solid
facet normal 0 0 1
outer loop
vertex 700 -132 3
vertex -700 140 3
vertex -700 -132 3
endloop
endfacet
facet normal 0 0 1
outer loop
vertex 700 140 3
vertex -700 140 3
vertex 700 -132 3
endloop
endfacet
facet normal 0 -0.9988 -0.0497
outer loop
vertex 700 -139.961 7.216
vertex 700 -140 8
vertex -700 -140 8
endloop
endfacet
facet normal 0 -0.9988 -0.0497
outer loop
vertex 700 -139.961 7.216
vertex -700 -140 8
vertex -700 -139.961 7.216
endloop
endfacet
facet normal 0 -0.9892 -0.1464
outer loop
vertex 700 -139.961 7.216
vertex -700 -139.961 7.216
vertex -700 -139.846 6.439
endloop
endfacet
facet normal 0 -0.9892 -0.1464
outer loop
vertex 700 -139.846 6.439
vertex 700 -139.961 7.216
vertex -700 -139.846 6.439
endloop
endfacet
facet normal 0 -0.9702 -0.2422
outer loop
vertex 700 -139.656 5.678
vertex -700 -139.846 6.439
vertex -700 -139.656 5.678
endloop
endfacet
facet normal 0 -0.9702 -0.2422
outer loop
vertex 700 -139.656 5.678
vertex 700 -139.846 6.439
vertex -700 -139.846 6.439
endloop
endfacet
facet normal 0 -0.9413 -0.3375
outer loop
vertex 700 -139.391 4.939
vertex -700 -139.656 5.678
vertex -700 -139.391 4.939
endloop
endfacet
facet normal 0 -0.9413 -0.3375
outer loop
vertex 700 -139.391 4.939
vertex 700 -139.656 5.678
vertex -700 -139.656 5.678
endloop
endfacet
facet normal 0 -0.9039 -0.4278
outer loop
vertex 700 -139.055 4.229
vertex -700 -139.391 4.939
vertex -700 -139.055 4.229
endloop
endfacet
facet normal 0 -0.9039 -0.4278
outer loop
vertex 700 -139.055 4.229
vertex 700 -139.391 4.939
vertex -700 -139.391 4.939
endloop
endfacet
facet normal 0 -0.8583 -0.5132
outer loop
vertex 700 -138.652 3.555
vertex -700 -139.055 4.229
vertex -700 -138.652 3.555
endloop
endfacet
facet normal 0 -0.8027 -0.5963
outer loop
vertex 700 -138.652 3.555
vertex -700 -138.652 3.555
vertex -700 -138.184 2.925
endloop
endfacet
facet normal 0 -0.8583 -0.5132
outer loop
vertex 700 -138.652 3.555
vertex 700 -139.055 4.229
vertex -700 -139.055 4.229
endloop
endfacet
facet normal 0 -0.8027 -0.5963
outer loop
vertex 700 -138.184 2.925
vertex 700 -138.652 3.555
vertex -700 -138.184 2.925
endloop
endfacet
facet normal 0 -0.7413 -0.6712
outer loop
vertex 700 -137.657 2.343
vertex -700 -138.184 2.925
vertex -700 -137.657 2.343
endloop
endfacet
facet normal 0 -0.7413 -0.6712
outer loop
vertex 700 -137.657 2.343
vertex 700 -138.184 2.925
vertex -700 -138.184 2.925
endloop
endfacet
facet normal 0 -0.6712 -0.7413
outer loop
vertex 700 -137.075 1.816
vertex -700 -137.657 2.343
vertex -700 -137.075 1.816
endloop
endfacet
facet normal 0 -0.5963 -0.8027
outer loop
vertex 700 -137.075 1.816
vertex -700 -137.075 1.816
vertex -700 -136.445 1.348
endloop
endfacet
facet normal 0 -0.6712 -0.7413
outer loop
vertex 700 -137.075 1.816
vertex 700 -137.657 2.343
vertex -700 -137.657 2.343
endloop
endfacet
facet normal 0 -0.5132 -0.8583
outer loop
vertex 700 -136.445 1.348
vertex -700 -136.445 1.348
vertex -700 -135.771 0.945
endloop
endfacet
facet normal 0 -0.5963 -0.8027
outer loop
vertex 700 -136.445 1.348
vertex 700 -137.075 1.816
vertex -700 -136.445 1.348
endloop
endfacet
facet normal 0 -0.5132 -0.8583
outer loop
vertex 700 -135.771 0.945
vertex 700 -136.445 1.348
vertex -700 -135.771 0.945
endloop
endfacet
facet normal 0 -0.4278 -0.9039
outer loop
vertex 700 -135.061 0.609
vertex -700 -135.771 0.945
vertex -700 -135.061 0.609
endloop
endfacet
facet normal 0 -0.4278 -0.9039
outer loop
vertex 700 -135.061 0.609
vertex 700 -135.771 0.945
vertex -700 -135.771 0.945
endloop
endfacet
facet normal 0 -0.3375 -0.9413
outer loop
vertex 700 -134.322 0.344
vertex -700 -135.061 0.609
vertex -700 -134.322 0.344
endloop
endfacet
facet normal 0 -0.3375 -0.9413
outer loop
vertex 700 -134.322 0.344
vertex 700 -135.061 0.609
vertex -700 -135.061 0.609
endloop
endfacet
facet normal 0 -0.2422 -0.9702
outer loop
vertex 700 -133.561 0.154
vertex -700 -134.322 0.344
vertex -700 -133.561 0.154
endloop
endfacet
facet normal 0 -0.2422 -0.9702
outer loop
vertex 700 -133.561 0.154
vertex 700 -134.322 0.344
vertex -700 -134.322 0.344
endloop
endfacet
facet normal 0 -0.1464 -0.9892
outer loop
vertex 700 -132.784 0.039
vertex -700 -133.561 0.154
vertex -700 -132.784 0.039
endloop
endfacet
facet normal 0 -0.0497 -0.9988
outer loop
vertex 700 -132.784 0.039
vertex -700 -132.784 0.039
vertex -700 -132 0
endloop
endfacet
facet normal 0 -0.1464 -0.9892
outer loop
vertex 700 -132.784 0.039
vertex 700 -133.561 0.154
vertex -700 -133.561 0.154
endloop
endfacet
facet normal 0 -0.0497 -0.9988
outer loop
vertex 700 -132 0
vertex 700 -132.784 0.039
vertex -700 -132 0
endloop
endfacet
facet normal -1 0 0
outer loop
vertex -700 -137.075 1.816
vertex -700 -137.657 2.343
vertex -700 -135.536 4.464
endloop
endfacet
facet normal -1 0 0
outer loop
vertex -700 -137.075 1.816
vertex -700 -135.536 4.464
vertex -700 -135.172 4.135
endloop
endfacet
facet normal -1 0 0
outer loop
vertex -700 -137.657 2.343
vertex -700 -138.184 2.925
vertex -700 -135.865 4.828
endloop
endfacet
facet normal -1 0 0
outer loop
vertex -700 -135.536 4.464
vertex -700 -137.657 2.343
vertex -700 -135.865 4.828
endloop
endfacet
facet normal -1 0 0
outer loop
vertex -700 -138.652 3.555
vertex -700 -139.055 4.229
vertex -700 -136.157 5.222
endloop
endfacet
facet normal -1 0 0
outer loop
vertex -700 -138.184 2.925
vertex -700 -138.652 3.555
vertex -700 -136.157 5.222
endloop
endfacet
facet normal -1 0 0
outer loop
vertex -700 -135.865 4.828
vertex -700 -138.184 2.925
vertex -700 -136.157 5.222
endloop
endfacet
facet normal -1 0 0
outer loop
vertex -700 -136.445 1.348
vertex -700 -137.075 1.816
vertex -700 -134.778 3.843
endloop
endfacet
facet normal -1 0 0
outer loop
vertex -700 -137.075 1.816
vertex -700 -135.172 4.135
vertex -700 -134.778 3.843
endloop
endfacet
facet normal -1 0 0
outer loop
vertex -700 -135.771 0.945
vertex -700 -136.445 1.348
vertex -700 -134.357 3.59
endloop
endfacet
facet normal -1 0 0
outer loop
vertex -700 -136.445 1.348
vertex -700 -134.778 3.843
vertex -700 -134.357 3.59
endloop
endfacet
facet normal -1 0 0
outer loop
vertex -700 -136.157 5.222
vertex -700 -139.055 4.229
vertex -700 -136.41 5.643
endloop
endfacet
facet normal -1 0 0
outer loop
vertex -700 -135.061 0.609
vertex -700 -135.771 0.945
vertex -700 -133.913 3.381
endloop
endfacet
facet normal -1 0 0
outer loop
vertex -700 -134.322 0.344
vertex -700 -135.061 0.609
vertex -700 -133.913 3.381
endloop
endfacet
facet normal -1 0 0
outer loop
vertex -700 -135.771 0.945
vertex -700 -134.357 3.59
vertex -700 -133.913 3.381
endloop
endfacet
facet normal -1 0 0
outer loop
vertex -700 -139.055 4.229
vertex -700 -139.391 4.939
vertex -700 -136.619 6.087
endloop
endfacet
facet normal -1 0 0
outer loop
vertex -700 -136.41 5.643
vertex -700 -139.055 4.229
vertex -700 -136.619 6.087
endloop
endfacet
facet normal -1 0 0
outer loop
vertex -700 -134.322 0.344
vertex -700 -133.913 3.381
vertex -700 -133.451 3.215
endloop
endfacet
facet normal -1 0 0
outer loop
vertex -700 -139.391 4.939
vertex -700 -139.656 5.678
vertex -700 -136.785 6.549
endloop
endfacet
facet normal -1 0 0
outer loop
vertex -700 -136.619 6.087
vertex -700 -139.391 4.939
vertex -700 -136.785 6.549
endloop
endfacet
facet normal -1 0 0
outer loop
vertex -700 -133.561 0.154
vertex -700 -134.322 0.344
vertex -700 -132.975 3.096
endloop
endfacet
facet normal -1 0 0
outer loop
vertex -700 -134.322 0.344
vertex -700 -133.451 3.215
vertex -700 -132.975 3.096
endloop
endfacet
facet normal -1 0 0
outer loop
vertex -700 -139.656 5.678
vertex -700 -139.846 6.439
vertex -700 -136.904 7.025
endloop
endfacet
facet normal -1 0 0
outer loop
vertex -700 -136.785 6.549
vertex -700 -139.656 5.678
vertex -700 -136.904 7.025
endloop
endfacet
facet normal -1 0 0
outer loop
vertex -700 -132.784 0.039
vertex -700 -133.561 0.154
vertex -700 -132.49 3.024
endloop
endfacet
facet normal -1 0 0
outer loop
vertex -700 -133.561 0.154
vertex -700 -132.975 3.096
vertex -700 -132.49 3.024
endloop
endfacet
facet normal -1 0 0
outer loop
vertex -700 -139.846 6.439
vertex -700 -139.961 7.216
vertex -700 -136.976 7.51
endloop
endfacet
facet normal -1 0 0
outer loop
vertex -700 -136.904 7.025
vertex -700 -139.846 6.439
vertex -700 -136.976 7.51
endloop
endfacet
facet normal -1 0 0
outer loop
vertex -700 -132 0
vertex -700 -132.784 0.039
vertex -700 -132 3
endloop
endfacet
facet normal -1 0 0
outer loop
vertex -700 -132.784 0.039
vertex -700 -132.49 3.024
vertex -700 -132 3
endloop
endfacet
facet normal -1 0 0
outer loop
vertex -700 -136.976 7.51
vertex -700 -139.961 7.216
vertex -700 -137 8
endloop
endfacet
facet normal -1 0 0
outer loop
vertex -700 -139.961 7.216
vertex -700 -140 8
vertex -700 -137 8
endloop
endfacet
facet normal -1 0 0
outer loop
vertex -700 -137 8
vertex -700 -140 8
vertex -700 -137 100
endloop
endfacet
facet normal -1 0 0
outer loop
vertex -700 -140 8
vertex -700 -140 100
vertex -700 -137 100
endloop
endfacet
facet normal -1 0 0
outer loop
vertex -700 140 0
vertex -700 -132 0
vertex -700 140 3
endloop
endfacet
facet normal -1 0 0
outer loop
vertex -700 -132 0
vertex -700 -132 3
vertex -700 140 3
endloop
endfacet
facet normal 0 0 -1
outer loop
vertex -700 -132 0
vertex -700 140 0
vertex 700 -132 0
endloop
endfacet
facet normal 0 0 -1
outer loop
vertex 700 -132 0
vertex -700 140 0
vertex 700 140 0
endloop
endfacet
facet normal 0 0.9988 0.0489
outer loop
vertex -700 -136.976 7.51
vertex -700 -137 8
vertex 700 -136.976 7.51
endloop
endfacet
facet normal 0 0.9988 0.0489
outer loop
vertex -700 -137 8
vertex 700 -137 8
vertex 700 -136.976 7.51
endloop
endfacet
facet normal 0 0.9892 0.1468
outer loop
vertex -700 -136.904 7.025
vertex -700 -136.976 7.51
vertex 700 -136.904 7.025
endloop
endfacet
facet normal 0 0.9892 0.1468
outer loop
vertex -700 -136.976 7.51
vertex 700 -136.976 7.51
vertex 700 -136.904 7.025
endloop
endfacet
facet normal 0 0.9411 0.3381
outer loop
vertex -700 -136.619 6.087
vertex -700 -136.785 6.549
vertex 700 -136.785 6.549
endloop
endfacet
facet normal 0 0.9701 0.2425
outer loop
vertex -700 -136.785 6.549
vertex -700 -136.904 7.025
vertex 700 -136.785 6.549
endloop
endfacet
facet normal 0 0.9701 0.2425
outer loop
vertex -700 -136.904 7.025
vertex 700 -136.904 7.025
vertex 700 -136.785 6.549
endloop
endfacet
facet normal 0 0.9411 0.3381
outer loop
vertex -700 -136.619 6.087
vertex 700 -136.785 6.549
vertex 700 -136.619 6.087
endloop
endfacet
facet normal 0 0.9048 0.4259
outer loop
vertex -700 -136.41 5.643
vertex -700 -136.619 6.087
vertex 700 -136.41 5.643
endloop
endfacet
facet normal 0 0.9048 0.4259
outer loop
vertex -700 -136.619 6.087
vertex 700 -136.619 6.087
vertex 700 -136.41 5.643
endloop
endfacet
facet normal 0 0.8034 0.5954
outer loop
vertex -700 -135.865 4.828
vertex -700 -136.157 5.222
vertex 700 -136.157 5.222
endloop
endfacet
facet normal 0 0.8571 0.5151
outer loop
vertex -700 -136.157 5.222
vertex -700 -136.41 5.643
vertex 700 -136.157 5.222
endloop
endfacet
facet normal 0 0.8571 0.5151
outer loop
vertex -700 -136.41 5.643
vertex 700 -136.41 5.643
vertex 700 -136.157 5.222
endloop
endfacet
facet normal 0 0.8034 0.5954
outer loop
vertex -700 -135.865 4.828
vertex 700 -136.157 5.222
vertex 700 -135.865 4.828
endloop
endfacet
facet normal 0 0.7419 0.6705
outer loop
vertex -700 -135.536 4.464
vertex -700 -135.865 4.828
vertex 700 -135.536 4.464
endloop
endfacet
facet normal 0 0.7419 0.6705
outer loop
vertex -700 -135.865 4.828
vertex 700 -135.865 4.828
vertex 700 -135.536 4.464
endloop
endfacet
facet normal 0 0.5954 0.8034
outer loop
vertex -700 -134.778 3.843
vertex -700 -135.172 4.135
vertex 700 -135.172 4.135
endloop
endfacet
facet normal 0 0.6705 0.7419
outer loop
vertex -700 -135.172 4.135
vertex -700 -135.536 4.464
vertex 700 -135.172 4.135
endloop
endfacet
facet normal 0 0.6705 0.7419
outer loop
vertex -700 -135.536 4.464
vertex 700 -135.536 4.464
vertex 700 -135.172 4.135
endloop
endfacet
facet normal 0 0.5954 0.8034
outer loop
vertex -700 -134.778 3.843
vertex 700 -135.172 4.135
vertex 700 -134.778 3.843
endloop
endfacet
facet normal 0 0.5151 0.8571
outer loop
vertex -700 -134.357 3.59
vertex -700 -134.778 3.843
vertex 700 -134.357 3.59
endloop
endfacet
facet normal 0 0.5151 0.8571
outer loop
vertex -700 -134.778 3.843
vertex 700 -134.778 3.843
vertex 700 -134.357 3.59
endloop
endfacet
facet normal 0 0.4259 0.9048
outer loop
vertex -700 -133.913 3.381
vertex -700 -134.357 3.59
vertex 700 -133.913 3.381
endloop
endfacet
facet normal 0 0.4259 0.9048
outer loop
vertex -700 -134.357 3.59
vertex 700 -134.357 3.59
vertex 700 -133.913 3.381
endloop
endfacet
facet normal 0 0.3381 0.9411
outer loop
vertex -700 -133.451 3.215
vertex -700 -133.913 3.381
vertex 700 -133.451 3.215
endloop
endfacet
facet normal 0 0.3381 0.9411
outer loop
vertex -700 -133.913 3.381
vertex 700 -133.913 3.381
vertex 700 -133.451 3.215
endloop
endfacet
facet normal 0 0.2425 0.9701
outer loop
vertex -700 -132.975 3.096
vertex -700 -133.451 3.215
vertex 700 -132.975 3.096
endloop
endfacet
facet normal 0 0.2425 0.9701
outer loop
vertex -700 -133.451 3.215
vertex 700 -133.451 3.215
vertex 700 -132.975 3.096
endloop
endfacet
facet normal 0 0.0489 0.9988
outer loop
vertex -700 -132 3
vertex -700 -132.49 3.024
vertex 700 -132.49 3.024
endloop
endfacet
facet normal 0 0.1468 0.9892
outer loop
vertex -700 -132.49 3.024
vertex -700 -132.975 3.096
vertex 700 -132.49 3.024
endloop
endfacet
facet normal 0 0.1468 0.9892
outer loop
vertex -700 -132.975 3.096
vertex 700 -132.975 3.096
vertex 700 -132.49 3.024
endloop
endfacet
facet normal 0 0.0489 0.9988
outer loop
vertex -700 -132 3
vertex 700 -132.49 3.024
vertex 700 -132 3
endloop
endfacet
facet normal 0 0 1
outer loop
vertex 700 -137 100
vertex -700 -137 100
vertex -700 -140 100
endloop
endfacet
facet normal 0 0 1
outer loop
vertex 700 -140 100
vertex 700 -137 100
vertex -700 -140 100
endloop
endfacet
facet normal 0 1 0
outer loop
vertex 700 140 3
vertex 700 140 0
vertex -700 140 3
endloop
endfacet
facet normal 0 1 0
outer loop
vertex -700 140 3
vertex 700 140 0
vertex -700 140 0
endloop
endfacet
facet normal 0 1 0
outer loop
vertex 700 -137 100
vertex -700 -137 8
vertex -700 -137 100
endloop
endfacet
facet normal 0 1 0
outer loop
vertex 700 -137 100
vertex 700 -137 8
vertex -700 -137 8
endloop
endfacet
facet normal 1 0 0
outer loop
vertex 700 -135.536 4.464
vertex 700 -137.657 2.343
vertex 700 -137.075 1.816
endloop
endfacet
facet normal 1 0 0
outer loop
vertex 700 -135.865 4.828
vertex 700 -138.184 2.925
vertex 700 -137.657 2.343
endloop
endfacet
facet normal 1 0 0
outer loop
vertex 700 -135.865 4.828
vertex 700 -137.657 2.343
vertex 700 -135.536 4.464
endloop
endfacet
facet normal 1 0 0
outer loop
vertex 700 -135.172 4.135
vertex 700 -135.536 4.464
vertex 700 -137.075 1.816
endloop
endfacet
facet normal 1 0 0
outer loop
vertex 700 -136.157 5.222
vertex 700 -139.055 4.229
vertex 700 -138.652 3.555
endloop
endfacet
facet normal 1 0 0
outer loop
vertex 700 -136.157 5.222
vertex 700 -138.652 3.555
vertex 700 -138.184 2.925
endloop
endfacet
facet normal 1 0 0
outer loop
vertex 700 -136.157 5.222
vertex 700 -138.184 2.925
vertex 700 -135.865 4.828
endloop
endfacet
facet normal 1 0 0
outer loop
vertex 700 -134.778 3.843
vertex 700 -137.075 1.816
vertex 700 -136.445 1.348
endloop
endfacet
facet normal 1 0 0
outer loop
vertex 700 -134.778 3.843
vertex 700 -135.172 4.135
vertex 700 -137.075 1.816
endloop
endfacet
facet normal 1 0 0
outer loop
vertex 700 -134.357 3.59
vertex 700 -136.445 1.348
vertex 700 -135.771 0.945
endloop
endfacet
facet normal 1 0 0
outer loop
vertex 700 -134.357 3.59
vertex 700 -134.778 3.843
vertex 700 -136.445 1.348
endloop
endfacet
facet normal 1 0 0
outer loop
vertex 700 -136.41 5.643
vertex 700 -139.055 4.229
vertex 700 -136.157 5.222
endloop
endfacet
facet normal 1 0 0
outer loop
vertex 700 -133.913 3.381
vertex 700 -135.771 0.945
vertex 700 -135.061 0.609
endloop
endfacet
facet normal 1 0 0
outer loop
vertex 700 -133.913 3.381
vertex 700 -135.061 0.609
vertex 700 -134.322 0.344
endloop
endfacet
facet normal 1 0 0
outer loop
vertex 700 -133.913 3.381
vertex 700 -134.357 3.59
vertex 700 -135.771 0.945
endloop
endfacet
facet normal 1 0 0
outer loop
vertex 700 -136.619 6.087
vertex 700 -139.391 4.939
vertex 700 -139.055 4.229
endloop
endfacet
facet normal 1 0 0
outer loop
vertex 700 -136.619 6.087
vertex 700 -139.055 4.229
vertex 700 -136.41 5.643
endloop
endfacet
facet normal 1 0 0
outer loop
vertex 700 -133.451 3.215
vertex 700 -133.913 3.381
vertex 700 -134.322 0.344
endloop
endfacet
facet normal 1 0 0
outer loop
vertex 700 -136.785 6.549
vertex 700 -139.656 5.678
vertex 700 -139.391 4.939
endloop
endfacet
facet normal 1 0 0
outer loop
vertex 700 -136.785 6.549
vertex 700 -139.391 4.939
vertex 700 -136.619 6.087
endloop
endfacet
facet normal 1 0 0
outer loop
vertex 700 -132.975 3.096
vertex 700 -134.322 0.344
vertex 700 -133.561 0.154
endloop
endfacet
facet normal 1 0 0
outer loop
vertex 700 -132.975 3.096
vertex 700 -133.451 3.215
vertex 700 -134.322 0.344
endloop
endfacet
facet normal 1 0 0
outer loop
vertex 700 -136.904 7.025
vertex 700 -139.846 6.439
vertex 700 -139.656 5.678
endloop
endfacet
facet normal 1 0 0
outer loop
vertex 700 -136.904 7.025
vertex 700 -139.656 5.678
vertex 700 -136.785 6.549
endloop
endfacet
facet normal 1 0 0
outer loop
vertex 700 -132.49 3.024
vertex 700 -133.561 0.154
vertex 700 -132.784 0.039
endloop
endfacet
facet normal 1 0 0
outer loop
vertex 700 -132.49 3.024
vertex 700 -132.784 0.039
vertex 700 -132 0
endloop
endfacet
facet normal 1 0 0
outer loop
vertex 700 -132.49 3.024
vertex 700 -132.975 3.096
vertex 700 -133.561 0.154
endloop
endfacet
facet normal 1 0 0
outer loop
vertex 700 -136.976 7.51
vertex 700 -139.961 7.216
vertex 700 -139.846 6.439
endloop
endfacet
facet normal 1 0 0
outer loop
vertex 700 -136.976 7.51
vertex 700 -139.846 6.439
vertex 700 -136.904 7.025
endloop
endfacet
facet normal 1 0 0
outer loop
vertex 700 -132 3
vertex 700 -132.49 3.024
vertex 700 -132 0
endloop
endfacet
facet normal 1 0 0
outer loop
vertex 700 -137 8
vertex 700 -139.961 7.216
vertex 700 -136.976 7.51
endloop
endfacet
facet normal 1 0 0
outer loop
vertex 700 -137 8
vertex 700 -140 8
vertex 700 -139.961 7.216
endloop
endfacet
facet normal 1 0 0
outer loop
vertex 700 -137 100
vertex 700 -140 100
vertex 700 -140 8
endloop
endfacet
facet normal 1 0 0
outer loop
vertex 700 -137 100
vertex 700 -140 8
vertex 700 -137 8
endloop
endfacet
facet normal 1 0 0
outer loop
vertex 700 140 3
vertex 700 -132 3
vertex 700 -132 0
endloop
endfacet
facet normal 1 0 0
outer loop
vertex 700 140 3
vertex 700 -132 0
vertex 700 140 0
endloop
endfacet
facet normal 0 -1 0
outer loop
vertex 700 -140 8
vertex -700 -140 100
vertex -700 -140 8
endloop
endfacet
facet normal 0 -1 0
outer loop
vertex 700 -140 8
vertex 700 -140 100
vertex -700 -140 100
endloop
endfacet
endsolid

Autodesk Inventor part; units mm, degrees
ref_plane "YZ Plane" through (0, 0, 0) normal (1, 0, 0) x (0, 1, 0)
ref_plane "XZ Plane" through (0, 0, 0) normal (0, 1, 0) x (-1, 0, 0)
ref_plane "XY Plane" through (0, 0, 0) normal (0, 0, 1) x (1, 0, 0)
sketch "Sketch1" plane through (0, 0, 0) normal (0, 0, 1) x (1, 0, 0)
  line L0 (700, 140) -> (-700, 140)
  line L1 (-700, 140) -> (-700, -140)
  line L2 (-700, -140) -> (700, -140)
  line L3 (700, -140) -> (700, 140)
  line L4 (700, 140) -> (-700, -140) construction
  line L5 (-700, 140) -> (700, -140) construction
  point P0 (0, 0)
  point P1 (0, 0)
  point P2 (700, 0)
  dimension "d32" = 280
  dimension "d33" = 1400
extrude "Plate1" add sketch "Sketch1" along normal blind 3
sketch "Sketch6" plane through (700, -137, 0) normal (0, -1, 0) x (1, 0, 0)
  line L0 (-1400, 0) -> (0, 0)
  line L1 (0, 0) -> (0, 100)
  line L2 (0, 100) -> (-1400, 100)
  line L3 (-1400, 100) -> (-1400, 0)
edge flange "Flange2" height 100 angle 90 thickness 3 bend radius 5 thickness toward (0, -1, 0) relief round relief width 3 relief depth 1.5 edges at (0, -140, 3) wall of the first edge with corners at (-700, -137, 0) (700, -137, 0) (700, -137, 100) (-700, -137, 100)
bend "Bend2"
corner "Corner2"
sketch "Sketch8" plane through (0, 0, 3) normal (0, 0, 1) x (1, 0, 0)
  line L0 (646.1751, 51.4978) -> (596.1751, 51.4978)
  line L1 (596.1751, 51.4978) -> (596.1751, 101.4978)
  line L2 (596.1751, 101.4978) -> (646.1751, 101.4978)
  line L3 (646.1751, 101.4978) -> (646.1751, 51.4978)
  line L4 (646.1751, 51.4978) -> (596.1751, 101.4978) construction
  line L5 (596.1751, 51.4978) -> (646.1751, 101.4978) construction
  circle A0 centre (652.9949, 44.678) radius 3.5
  circle A1 centre (589.3553, 44.678) radius 3.5
  circle A2 centre (589.3553, 108.3176) radius 3.5
  circle A3 centre (652.9949, 108.3176) radius 3.5
  circle A4 centre (621.1751, 76.4978) radius 45 construction
  point P0 (0, 0)
  dimension "d51" = 50
  dimension "d52" = 50
  dimension "d53" = 7
  dimension "d54" = 90
cut "Cut3" [suppressed]
pattern_linear "Rectangular Pattern1" [suppressed]
equation "\"d55\" = Thickness"
equation "\"d2\" = Thickness"
equation "\"d36\" = BendReliefWidth"
equation "\"d37\" = BendReliefDepth"
equation "\"d38\" = MinimumRemnant"
equation "\"d39\" = TransitionRadius"
equation "\"d42\" = BendRadius"
equation "\"d43\" = CornerReliefSize"
equation "\"d44\" = GapSize"
equation "\"d45\" = JacobiRadiusSize"
equation "\"BendReliefWidth\" = Thickness"
equation "\"BendReliefDepth\" = 0.5 * Thickness"
equation "\"CornerReliefSize\" = 4 * Thickness"
equation "\"MinimumRemnant\" = 2 * Thickness"
equation "\"TransitionRadius\" = BendRadius"
equation "\"JacobiRadiusSize\" = BendRadius"
equation "\"GapSize\" = Thickness"
equation "\"Thickness\" = 3"
equation "\"BendRadius\" = 5"
properties part number "TKS 3006 BOTTOM DS diameter way blind" material "Stainless Steel"
